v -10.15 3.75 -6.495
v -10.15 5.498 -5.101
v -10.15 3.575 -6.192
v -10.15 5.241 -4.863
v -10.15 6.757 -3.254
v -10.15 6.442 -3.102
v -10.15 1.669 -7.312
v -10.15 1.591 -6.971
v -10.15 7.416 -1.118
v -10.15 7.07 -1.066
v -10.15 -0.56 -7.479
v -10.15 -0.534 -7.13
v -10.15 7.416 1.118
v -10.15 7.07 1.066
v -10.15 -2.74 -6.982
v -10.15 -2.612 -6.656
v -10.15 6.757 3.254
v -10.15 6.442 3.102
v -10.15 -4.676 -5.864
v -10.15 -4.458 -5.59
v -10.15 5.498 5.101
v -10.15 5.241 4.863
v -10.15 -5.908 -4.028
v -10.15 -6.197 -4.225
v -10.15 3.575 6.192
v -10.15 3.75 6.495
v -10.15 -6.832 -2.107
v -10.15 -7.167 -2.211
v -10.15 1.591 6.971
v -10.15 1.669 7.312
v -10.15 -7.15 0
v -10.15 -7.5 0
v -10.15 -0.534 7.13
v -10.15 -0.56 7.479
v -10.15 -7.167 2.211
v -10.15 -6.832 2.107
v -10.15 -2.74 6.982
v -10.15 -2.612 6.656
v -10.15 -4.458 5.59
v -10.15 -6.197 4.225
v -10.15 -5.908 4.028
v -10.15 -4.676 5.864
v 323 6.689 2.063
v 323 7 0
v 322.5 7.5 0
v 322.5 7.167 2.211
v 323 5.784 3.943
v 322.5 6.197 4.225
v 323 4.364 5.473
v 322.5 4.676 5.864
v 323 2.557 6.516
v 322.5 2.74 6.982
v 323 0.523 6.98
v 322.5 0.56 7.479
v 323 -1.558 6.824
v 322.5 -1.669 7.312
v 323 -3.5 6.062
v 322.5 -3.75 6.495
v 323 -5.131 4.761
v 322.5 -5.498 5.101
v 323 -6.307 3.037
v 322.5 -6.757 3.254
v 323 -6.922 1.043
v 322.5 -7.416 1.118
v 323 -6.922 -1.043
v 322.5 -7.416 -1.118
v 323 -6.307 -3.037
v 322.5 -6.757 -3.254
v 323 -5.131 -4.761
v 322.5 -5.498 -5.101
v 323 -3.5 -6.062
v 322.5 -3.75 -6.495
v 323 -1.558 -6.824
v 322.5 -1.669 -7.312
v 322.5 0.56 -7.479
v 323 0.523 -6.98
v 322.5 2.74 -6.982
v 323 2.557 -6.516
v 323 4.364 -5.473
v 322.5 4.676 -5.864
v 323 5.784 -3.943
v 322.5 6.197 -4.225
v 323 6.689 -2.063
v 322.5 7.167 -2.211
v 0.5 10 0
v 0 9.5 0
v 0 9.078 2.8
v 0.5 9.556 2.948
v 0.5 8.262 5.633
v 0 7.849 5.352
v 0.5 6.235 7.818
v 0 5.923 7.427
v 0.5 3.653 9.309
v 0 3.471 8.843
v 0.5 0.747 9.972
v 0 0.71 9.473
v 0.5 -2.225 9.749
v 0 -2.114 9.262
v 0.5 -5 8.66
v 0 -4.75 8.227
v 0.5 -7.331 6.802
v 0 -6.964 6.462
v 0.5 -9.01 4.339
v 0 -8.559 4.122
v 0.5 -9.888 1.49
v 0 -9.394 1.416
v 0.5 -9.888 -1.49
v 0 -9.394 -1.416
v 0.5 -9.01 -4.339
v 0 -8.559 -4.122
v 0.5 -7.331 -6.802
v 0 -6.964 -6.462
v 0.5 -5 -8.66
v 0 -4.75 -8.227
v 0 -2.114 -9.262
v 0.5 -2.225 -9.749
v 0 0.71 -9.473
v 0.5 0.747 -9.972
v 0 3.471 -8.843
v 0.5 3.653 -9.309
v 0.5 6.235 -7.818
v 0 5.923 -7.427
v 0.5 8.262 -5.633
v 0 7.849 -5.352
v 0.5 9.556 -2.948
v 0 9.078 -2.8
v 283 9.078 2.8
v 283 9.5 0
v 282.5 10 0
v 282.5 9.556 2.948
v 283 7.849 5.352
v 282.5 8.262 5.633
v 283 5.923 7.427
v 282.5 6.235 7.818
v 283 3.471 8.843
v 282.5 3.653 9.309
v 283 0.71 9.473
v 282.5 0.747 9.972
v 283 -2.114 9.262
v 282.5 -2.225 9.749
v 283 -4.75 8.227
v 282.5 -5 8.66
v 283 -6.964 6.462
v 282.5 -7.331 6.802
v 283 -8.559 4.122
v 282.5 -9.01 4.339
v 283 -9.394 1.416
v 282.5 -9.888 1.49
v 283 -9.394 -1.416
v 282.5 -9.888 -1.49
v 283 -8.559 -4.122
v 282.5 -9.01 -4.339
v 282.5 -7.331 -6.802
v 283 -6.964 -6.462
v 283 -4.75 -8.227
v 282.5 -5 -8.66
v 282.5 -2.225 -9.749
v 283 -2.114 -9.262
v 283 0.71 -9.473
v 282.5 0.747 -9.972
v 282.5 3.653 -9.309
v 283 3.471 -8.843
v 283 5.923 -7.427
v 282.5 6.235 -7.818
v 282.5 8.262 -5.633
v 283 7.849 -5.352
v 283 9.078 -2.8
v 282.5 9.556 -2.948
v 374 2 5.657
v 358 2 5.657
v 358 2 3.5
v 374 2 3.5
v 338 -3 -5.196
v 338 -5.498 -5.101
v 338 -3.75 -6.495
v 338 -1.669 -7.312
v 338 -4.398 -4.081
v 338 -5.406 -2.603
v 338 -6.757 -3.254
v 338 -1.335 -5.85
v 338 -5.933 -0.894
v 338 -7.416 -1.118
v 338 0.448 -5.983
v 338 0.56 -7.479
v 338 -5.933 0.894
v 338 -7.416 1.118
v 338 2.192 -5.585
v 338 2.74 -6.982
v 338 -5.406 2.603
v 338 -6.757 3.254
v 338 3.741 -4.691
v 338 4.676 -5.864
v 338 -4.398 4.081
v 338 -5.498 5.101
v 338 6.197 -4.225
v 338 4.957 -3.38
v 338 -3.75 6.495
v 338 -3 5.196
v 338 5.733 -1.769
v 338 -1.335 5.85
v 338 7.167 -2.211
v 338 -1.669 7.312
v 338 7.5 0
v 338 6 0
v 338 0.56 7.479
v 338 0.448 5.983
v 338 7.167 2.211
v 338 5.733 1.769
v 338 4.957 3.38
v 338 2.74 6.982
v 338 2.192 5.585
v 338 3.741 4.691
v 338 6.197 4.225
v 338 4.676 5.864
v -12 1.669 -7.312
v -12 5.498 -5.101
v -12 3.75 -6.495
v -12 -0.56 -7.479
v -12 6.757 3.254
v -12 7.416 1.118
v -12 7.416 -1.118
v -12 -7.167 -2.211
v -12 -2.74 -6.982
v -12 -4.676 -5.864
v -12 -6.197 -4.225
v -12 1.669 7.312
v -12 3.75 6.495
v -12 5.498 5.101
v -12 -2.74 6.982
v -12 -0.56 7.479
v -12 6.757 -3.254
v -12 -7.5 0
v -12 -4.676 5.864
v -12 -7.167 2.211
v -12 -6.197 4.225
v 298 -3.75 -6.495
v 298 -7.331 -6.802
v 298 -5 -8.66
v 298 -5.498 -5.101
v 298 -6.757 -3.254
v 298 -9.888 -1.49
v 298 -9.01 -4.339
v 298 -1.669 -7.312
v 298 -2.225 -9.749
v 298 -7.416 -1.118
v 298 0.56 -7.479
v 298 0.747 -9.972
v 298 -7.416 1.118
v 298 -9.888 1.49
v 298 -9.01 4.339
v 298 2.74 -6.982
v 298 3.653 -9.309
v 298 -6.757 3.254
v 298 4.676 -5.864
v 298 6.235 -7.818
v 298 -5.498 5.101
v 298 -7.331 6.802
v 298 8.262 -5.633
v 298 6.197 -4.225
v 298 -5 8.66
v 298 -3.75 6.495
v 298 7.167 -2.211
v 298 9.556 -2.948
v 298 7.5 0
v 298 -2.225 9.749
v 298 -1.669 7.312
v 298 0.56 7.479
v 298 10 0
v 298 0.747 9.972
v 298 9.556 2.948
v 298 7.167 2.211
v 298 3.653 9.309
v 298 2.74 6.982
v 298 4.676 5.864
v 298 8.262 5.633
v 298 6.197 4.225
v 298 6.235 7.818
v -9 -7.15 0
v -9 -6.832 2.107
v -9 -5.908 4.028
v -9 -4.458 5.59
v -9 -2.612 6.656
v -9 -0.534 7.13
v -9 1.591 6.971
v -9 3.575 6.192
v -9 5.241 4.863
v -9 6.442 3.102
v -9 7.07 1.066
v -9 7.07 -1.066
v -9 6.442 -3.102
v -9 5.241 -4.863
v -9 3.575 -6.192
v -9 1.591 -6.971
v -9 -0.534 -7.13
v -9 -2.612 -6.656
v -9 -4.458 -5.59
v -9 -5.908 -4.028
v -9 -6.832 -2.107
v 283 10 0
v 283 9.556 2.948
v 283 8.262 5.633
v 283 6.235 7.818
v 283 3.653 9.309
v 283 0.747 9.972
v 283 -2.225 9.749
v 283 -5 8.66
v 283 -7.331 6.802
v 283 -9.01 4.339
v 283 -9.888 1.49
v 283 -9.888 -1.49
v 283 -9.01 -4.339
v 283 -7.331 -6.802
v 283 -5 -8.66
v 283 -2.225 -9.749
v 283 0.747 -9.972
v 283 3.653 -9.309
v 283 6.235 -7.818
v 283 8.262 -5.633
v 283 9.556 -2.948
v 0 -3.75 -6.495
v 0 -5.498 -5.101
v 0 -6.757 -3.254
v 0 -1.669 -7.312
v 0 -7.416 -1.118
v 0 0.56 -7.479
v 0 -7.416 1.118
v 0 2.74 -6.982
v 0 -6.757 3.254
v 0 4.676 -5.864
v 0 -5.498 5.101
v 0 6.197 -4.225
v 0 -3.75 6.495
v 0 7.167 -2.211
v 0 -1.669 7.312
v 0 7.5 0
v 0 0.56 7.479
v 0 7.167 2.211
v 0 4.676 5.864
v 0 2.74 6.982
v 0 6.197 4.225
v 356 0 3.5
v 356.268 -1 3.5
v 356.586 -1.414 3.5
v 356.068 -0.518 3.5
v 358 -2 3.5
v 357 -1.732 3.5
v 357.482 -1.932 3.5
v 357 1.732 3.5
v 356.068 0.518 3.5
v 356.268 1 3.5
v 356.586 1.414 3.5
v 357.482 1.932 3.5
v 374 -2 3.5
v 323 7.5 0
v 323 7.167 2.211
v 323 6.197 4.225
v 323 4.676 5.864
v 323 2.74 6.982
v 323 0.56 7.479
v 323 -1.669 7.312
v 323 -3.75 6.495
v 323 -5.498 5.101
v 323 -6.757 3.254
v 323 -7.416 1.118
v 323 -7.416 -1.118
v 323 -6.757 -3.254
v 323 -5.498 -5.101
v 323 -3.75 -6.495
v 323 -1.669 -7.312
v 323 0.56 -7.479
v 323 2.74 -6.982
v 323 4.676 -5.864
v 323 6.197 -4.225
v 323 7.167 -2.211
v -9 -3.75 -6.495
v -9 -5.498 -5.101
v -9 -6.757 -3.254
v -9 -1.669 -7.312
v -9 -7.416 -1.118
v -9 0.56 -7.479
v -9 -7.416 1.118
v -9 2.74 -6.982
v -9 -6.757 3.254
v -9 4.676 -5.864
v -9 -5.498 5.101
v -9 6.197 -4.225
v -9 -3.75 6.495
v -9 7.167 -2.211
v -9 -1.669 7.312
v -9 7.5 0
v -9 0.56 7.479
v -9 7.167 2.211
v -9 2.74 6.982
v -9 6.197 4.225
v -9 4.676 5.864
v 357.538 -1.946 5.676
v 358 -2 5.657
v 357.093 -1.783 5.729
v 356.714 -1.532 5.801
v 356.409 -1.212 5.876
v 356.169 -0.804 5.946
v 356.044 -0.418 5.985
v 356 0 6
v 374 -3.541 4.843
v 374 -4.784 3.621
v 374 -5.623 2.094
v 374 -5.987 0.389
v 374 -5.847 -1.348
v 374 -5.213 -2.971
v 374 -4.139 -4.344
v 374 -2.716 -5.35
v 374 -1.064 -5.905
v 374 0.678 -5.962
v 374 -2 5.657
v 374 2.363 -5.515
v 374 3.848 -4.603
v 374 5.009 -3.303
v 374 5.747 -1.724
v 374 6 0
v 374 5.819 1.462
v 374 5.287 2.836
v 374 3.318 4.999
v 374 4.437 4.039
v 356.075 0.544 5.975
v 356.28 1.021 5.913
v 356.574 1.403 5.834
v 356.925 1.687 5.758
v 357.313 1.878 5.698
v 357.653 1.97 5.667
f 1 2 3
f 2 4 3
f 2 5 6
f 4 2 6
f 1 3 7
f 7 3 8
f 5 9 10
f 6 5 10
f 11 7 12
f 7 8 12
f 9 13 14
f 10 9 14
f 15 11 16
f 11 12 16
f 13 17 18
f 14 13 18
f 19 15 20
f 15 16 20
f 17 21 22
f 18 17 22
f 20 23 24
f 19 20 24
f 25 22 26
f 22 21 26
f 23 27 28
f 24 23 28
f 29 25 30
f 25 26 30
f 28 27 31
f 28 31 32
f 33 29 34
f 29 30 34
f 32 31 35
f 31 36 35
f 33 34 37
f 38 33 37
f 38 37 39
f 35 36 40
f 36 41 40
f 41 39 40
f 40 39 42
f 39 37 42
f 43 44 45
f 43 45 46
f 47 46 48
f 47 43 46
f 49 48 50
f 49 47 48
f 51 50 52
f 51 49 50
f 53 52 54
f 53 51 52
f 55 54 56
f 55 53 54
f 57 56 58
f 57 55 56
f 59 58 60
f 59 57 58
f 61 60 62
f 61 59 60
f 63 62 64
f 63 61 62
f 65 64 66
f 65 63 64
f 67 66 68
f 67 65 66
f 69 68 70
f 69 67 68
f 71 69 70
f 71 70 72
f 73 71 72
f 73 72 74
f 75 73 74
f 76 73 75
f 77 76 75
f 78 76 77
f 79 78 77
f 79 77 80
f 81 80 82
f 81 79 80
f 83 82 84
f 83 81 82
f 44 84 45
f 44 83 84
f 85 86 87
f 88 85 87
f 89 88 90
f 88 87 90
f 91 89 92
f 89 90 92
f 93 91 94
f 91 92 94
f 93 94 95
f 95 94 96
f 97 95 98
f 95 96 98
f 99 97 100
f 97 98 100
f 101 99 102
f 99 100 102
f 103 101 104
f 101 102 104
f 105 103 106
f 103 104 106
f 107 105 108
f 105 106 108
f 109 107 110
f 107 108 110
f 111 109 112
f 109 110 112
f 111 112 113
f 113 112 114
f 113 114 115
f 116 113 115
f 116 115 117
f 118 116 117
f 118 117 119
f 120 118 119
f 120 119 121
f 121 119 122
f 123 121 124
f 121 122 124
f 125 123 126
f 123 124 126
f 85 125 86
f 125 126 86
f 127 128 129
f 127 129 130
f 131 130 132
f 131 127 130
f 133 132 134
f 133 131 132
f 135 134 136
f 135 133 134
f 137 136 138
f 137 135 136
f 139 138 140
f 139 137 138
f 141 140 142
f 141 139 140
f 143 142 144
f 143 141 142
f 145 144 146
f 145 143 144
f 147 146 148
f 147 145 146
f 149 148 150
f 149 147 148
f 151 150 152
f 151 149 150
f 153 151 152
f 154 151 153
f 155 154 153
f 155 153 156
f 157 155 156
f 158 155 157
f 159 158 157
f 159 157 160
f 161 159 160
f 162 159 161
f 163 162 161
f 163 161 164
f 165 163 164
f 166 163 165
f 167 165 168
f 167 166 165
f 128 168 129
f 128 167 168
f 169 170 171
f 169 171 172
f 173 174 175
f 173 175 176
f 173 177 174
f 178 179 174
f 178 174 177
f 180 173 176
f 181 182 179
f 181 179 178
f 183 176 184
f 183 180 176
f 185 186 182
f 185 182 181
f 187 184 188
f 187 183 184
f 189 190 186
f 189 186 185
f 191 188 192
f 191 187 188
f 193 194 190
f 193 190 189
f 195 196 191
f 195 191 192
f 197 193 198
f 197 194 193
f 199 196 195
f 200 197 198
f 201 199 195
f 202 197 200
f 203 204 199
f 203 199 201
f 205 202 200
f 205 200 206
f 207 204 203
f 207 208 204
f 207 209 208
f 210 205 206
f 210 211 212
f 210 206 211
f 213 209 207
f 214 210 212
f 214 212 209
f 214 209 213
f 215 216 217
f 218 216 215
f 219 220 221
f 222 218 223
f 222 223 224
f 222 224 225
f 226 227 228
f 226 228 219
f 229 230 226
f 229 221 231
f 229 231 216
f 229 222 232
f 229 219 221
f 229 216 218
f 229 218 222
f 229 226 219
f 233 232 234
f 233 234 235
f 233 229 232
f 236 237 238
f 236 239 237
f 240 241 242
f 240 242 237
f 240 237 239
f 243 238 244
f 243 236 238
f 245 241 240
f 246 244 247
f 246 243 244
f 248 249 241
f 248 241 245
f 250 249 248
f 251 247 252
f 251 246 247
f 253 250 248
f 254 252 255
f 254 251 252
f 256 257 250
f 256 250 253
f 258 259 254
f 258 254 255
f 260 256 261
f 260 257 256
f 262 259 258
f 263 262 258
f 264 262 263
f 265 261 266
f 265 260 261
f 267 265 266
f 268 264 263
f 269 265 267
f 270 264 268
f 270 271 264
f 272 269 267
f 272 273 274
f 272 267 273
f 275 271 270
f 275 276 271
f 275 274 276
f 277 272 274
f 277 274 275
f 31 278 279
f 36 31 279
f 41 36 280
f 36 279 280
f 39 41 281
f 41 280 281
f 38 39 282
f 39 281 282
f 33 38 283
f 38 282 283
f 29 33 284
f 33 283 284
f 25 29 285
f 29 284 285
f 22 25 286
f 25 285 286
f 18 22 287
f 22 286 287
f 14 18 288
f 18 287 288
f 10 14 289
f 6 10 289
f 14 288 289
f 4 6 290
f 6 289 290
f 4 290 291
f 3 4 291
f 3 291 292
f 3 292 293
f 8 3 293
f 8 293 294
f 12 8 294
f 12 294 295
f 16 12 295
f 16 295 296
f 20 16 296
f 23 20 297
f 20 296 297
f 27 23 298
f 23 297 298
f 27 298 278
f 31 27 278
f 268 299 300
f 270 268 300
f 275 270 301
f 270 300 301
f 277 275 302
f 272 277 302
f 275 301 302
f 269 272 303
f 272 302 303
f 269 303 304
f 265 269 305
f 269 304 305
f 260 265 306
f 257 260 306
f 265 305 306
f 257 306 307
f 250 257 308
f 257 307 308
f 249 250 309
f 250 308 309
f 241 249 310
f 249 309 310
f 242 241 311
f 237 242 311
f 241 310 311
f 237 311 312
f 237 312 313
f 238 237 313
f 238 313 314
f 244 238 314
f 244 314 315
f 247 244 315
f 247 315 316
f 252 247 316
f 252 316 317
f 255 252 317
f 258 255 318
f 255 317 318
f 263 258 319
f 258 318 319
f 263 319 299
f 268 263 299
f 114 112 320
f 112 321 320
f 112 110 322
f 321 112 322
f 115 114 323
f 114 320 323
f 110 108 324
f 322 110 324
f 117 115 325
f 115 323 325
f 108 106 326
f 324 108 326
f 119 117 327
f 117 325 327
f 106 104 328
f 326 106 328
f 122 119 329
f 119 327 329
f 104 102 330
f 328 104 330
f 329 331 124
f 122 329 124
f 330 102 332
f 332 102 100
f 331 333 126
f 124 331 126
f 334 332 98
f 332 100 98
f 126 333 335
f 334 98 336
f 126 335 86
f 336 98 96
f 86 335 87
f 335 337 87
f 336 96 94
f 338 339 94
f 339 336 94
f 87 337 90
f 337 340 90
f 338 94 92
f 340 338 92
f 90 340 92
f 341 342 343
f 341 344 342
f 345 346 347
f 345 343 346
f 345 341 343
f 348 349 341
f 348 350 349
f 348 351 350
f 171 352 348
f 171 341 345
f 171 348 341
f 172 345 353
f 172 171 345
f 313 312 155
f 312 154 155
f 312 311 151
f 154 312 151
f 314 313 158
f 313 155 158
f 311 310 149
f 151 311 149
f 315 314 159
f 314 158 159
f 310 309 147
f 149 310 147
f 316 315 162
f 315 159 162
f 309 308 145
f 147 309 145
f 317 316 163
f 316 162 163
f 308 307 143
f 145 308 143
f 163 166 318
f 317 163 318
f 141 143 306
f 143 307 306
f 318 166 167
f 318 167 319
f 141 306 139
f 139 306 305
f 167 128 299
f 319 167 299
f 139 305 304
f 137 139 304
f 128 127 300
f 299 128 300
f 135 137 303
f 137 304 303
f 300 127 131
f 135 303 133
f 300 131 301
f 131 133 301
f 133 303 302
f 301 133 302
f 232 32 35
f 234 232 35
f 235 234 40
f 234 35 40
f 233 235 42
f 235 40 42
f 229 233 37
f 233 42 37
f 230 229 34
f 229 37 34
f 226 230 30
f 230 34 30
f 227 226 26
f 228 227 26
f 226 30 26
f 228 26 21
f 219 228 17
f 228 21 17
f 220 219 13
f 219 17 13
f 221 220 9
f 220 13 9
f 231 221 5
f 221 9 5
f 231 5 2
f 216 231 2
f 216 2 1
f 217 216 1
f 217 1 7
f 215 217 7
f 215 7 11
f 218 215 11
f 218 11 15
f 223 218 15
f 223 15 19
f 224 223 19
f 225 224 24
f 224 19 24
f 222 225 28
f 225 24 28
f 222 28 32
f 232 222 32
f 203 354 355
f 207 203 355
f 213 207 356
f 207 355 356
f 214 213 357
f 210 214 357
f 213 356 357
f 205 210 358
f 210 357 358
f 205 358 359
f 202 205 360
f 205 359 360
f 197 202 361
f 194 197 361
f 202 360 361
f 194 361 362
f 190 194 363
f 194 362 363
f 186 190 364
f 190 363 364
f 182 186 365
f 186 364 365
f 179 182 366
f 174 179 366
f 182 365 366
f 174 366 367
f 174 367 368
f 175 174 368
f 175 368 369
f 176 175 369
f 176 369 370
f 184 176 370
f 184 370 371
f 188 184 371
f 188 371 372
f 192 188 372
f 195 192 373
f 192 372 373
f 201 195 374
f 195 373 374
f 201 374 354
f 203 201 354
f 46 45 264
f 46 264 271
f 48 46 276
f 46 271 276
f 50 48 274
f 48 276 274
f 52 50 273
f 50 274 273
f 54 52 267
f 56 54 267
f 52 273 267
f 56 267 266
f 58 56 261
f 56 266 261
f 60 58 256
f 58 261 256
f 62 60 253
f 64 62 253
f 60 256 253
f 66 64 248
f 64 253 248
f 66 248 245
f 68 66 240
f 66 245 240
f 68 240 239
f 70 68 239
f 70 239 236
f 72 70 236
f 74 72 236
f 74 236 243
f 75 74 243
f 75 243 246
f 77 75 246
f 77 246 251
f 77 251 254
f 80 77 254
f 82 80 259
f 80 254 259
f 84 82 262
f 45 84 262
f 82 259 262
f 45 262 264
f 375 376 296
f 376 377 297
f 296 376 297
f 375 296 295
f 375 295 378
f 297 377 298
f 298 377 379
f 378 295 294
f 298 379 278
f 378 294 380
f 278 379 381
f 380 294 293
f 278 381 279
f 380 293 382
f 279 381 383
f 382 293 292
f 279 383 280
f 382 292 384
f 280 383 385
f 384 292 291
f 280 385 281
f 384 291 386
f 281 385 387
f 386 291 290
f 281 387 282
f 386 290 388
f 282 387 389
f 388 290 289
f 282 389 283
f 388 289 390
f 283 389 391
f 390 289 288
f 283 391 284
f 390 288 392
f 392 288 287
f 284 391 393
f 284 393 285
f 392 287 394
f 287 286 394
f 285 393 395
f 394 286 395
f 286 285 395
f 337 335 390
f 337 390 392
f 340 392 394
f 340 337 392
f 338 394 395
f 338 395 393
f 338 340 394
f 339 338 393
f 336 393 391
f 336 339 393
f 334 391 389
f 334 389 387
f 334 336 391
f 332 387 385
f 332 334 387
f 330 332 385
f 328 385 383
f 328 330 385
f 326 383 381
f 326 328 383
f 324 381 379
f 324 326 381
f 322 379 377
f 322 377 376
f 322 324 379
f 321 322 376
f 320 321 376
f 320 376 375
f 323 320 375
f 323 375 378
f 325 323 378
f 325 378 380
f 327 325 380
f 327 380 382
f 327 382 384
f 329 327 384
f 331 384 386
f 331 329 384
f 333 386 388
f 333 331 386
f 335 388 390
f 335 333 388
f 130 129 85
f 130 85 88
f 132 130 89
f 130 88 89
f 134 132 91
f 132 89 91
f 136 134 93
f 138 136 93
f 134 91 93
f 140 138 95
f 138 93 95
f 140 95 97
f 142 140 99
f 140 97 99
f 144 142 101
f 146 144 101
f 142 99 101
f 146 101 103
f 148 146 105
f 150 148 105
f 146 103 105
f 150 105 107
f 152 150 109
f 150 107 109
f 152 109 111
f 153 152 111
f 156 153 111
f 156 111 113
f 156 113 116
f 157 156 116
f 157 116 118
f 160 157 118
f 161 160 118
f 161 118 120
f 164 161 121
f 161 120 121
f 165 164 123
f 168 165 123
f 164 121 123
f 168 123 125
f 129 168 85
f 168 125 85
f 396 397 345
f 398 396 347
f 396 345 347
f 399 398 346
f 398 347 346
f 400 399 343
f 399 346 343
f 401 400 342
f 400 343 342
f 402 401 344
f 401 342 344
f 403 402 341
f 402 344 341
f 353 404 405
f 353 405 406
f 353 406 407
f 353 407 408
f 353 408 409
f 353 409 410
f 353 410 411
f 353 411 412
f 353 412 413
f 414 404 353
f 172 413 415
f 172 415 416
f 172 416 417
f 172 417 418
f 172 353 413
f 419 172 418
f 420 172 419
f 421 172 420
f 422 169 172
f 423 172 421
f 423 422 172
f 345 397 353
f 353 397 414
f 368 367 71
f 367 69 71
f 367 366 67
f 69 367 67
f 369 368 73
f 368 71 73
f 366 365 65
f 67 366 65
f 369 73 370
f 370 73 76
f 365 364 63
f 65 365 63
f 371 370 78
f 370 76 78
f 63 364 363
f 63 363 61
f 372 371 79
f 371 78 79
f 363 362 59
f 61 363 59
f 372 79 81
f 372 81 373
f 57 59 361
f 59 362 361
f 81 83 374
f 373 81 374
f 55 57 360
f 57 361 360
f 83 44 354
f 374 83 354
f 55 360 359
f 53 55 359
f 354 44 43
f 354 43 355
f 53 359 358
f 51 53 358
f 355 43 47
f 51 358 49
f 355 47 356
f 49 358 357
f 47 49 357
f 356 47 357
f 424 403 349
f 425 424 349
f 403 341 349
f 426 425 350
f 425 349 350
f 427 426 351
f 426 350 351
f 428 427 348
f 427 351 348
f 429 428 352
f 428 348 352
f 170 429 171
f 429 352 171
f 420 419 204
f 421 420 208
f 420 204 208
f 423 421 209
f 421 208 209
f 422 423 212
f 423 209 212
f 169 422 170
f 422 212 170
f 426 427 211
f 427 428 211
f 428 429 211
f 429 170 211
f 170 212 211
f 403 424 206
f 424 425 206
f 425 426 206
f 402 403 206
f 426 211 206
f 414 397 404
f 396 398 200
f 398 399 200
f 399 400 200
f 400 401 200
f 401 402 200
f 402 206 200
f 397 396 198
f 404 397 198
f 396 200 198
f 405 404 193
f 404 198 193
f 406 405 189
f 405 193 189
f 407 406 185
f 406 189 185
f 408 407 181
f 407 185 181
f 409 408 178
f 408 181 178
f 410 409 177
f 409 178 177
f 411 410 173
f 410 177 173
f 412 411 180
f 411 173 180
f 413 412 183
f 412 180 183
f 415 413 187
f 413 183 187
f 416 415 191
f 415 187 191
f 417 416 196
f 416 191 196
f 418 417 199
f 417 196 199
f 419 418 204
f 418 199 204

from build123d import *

# Parameters (mm, degrees)
F0_R      = 7.5
F1_DEPTH  = 9
F2_R      = 7.15
F3_DEPTH  = 1.15
F4_R      = 7.5
F5_DEPTH  = 1.85
F6_R      = 10
F7_DEPTH  = 283
F8_SIZE   = 0.5
F9_R      = 10
F10_DEPTH = 15
F11_R     = 7.5
F12_DEPTH = 25
F13_SIZE  = 0.5
F14_R     = 7.5
F15_DEPTH = 15
F16_R     = 6
F17_DEPTH = 36
F19_W     = 18
F19_H     = 4
F20_DEPTH = 2.5
F21_R     = 1.9999


# Not quite as in the source:
# - a fillet or chamfer is up to 0.001 mm smaller than in the source, because OpenCascade refuses the exact size


with BuildPart() as f1:
    # F0 (on Right) → F1 (new body)
    with BuildSketch(Plane.YZ):
        Circle(F0_R)
    extrude(amount=-F1_DEPTH)

    # F2 (on face) → F3 (join)
    with BuildSketch(Plane(origin=(-9, 0, 0), x_dir=(0, -1, 0), z_dir=(-1, 0, 0))):
        Circle(F2_R)
    extrude(amount=F3_DEPTH)

    # F4 (on face) → F5 (join)
    with BuildSketch(Plane(origin=(-10.15, 0, 0), x_dir=(0, -1, 0), z_dir=(-1, 0, 0))):
        Circle(F4_R)
    extrude(amount=F5_DEPTH)

    # F6 (on Right) → F7 (join)
    with BuildSketch(Plane.YZ):
        Circle(F6_R)
    extrude(amount=F7_DEPTH)

    # F8
    f8_edges = [f1.edges().sort_by_distance(p)[0] for p in [
        (283, -10, 0),
        (0, -10, 0),
    ]]
    chamfer(f8_edges, length=F8_SIZE)

    # F9 (on face) → F10 (join)
    with BuildSketch(Plane.YZ.offset(283)):
        Circle(F9_R)
    extrude(amount=F10_DEPTH)

    # F11 (on face) → F12 (join)
    with BuildSketch(Plane.YZ.offset(298)):
        Circle(F11_R)
    extrude(amount=F12_DEPTH)

    # F13
    f13_edges = [f1.edges().sort_by_distance(p)[0] for p in [
        (323, -7.5, 0),
    ]]
    chamfer(f13_edges, length=F13_SIZE)

    # F14 (on face) → F15 (join)
    with BuildSketch(Plane.YZ.offset(323)):
        Circle(F14_R)
    extrude(amount=F15_DEPTH)

    # F16 (on face) → F17 (join)
    with BuildSketch(Plane.YZ.offset(338)):
        Circle(F16_R)
    extrude(amount=F17_DEPTH)

    # F19 (on offset) → F20 (cut)
    with BuildSketch(Plane.XY.offset(6)):
        with Locations((365, 0)):
            Rectangle(F19_W, F19_H)
    extrude(amount=-F20_DEPTH, mode=Mode.SUBTRACT)

    # F21 (radius 2 in the source; OpenCascade refuses exactly that, so slightly less here)
    f21_edges = [f1.edges().sort_by_distance(p)[0] for p in [
        (356, 2, 4.578427),
        (356, -2, 4.578427),
    ]]
    fillet(f21_edges, radius=F21_R)


solid = f1.part
